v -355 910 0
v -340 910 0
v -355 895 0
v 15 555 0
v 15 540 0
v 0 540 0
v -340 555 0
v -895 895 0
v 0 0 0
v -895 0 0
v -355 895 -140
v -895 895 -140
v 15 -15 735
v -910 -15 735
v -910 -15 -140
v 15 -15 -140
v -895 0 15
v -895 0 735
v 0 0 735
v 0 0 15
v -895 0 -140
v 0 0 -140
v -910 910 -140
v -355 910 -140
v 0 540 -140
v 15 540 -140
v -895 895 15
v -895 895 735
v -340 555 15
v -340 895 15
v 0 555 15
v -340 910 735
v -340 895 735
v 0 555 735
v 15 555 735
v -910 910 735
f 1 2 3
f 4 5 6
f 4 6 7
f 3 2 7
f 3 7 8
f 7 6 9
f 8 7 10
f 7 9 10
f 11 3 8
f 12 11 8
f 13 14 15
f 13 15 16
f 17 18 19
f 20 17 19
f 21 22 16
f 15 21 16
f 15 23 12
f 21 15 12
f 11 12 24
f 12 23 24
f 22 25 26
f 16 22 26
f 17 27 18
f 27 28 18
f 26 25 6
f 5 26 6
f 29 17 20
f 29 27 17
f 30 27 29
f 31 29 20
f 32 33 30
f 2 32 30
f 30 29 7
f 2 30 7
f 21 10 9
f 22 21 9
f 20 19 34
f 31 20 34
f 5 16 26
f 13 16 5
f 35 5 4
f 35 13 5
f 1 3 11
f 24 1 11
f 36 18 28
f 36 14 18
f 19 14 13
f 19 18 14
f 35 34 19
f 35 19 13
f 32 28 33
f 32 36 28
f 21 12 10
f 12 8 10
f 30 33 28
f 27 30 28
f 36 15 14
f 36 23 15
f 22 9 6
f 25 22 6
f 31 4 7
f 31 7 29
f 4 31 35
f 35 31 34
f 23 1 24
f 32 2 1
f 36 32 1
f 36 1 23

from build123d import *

# Parameters (mm, degrees)
F2_DEPTH  = 15
F3_DEPTH  = 15
F6_DEPTH  = 15
F9_DEPTH  = 15
F11_W     = 910
F11_H     = 875
F12_DEPTH = 15


with BuildPart() as f2:
    # F0 (on Right) → F2 (new body)
    with BuildSketch(Plane.YZ):
        Polygon((-15, -140), (540, -140), (540, 0), (555, 0), (555, 735), (-15, 735), align=None)
    extrude(amount=F2_DEPTH)

    # F1 (on Top) → F3 (join)
    with BuildSketch(Plane.XY):
        Polygon((-895, 0), (0, 0), (0, 555), (-340, 555), (-340, 895), (-895, 895), align=None)
    extrude(amount=F3_DEPTH)

    # F5 (on offset) → F6 (join)
    with BuildSketch(Plane(origin=(-895, 0, 0), x_dir=(0, -1, 0), z_dir=(-1, 0, 0))):
        Polygon((0, -140), (0, 0), (0, 735), (-895, 735), (-895, -140), align=None)
    extrude(amount=F6_DEPTH)

    # F8 (on offset) → F9 (join)
    with BuildSketch(Plane(origin=(0, 895, 0), x_dir=(-1, 0, 0), z_dir=(0, 1, 0))):
        Polygon((355, -140), (910, -140), (910, 735), (340, 735), (340, 0), (355, 0), align=None)
    extrude(amount=F9_DEPTH)

    # F11 (on offset) → F12 (join)
    with BuildSketch(Plane.XZ):
        with Locations((-455, 297.5)):
            Rectangle(F11_W, F11_H)
    extrude(amount=F12_DEPTH)


solid = f2.part
